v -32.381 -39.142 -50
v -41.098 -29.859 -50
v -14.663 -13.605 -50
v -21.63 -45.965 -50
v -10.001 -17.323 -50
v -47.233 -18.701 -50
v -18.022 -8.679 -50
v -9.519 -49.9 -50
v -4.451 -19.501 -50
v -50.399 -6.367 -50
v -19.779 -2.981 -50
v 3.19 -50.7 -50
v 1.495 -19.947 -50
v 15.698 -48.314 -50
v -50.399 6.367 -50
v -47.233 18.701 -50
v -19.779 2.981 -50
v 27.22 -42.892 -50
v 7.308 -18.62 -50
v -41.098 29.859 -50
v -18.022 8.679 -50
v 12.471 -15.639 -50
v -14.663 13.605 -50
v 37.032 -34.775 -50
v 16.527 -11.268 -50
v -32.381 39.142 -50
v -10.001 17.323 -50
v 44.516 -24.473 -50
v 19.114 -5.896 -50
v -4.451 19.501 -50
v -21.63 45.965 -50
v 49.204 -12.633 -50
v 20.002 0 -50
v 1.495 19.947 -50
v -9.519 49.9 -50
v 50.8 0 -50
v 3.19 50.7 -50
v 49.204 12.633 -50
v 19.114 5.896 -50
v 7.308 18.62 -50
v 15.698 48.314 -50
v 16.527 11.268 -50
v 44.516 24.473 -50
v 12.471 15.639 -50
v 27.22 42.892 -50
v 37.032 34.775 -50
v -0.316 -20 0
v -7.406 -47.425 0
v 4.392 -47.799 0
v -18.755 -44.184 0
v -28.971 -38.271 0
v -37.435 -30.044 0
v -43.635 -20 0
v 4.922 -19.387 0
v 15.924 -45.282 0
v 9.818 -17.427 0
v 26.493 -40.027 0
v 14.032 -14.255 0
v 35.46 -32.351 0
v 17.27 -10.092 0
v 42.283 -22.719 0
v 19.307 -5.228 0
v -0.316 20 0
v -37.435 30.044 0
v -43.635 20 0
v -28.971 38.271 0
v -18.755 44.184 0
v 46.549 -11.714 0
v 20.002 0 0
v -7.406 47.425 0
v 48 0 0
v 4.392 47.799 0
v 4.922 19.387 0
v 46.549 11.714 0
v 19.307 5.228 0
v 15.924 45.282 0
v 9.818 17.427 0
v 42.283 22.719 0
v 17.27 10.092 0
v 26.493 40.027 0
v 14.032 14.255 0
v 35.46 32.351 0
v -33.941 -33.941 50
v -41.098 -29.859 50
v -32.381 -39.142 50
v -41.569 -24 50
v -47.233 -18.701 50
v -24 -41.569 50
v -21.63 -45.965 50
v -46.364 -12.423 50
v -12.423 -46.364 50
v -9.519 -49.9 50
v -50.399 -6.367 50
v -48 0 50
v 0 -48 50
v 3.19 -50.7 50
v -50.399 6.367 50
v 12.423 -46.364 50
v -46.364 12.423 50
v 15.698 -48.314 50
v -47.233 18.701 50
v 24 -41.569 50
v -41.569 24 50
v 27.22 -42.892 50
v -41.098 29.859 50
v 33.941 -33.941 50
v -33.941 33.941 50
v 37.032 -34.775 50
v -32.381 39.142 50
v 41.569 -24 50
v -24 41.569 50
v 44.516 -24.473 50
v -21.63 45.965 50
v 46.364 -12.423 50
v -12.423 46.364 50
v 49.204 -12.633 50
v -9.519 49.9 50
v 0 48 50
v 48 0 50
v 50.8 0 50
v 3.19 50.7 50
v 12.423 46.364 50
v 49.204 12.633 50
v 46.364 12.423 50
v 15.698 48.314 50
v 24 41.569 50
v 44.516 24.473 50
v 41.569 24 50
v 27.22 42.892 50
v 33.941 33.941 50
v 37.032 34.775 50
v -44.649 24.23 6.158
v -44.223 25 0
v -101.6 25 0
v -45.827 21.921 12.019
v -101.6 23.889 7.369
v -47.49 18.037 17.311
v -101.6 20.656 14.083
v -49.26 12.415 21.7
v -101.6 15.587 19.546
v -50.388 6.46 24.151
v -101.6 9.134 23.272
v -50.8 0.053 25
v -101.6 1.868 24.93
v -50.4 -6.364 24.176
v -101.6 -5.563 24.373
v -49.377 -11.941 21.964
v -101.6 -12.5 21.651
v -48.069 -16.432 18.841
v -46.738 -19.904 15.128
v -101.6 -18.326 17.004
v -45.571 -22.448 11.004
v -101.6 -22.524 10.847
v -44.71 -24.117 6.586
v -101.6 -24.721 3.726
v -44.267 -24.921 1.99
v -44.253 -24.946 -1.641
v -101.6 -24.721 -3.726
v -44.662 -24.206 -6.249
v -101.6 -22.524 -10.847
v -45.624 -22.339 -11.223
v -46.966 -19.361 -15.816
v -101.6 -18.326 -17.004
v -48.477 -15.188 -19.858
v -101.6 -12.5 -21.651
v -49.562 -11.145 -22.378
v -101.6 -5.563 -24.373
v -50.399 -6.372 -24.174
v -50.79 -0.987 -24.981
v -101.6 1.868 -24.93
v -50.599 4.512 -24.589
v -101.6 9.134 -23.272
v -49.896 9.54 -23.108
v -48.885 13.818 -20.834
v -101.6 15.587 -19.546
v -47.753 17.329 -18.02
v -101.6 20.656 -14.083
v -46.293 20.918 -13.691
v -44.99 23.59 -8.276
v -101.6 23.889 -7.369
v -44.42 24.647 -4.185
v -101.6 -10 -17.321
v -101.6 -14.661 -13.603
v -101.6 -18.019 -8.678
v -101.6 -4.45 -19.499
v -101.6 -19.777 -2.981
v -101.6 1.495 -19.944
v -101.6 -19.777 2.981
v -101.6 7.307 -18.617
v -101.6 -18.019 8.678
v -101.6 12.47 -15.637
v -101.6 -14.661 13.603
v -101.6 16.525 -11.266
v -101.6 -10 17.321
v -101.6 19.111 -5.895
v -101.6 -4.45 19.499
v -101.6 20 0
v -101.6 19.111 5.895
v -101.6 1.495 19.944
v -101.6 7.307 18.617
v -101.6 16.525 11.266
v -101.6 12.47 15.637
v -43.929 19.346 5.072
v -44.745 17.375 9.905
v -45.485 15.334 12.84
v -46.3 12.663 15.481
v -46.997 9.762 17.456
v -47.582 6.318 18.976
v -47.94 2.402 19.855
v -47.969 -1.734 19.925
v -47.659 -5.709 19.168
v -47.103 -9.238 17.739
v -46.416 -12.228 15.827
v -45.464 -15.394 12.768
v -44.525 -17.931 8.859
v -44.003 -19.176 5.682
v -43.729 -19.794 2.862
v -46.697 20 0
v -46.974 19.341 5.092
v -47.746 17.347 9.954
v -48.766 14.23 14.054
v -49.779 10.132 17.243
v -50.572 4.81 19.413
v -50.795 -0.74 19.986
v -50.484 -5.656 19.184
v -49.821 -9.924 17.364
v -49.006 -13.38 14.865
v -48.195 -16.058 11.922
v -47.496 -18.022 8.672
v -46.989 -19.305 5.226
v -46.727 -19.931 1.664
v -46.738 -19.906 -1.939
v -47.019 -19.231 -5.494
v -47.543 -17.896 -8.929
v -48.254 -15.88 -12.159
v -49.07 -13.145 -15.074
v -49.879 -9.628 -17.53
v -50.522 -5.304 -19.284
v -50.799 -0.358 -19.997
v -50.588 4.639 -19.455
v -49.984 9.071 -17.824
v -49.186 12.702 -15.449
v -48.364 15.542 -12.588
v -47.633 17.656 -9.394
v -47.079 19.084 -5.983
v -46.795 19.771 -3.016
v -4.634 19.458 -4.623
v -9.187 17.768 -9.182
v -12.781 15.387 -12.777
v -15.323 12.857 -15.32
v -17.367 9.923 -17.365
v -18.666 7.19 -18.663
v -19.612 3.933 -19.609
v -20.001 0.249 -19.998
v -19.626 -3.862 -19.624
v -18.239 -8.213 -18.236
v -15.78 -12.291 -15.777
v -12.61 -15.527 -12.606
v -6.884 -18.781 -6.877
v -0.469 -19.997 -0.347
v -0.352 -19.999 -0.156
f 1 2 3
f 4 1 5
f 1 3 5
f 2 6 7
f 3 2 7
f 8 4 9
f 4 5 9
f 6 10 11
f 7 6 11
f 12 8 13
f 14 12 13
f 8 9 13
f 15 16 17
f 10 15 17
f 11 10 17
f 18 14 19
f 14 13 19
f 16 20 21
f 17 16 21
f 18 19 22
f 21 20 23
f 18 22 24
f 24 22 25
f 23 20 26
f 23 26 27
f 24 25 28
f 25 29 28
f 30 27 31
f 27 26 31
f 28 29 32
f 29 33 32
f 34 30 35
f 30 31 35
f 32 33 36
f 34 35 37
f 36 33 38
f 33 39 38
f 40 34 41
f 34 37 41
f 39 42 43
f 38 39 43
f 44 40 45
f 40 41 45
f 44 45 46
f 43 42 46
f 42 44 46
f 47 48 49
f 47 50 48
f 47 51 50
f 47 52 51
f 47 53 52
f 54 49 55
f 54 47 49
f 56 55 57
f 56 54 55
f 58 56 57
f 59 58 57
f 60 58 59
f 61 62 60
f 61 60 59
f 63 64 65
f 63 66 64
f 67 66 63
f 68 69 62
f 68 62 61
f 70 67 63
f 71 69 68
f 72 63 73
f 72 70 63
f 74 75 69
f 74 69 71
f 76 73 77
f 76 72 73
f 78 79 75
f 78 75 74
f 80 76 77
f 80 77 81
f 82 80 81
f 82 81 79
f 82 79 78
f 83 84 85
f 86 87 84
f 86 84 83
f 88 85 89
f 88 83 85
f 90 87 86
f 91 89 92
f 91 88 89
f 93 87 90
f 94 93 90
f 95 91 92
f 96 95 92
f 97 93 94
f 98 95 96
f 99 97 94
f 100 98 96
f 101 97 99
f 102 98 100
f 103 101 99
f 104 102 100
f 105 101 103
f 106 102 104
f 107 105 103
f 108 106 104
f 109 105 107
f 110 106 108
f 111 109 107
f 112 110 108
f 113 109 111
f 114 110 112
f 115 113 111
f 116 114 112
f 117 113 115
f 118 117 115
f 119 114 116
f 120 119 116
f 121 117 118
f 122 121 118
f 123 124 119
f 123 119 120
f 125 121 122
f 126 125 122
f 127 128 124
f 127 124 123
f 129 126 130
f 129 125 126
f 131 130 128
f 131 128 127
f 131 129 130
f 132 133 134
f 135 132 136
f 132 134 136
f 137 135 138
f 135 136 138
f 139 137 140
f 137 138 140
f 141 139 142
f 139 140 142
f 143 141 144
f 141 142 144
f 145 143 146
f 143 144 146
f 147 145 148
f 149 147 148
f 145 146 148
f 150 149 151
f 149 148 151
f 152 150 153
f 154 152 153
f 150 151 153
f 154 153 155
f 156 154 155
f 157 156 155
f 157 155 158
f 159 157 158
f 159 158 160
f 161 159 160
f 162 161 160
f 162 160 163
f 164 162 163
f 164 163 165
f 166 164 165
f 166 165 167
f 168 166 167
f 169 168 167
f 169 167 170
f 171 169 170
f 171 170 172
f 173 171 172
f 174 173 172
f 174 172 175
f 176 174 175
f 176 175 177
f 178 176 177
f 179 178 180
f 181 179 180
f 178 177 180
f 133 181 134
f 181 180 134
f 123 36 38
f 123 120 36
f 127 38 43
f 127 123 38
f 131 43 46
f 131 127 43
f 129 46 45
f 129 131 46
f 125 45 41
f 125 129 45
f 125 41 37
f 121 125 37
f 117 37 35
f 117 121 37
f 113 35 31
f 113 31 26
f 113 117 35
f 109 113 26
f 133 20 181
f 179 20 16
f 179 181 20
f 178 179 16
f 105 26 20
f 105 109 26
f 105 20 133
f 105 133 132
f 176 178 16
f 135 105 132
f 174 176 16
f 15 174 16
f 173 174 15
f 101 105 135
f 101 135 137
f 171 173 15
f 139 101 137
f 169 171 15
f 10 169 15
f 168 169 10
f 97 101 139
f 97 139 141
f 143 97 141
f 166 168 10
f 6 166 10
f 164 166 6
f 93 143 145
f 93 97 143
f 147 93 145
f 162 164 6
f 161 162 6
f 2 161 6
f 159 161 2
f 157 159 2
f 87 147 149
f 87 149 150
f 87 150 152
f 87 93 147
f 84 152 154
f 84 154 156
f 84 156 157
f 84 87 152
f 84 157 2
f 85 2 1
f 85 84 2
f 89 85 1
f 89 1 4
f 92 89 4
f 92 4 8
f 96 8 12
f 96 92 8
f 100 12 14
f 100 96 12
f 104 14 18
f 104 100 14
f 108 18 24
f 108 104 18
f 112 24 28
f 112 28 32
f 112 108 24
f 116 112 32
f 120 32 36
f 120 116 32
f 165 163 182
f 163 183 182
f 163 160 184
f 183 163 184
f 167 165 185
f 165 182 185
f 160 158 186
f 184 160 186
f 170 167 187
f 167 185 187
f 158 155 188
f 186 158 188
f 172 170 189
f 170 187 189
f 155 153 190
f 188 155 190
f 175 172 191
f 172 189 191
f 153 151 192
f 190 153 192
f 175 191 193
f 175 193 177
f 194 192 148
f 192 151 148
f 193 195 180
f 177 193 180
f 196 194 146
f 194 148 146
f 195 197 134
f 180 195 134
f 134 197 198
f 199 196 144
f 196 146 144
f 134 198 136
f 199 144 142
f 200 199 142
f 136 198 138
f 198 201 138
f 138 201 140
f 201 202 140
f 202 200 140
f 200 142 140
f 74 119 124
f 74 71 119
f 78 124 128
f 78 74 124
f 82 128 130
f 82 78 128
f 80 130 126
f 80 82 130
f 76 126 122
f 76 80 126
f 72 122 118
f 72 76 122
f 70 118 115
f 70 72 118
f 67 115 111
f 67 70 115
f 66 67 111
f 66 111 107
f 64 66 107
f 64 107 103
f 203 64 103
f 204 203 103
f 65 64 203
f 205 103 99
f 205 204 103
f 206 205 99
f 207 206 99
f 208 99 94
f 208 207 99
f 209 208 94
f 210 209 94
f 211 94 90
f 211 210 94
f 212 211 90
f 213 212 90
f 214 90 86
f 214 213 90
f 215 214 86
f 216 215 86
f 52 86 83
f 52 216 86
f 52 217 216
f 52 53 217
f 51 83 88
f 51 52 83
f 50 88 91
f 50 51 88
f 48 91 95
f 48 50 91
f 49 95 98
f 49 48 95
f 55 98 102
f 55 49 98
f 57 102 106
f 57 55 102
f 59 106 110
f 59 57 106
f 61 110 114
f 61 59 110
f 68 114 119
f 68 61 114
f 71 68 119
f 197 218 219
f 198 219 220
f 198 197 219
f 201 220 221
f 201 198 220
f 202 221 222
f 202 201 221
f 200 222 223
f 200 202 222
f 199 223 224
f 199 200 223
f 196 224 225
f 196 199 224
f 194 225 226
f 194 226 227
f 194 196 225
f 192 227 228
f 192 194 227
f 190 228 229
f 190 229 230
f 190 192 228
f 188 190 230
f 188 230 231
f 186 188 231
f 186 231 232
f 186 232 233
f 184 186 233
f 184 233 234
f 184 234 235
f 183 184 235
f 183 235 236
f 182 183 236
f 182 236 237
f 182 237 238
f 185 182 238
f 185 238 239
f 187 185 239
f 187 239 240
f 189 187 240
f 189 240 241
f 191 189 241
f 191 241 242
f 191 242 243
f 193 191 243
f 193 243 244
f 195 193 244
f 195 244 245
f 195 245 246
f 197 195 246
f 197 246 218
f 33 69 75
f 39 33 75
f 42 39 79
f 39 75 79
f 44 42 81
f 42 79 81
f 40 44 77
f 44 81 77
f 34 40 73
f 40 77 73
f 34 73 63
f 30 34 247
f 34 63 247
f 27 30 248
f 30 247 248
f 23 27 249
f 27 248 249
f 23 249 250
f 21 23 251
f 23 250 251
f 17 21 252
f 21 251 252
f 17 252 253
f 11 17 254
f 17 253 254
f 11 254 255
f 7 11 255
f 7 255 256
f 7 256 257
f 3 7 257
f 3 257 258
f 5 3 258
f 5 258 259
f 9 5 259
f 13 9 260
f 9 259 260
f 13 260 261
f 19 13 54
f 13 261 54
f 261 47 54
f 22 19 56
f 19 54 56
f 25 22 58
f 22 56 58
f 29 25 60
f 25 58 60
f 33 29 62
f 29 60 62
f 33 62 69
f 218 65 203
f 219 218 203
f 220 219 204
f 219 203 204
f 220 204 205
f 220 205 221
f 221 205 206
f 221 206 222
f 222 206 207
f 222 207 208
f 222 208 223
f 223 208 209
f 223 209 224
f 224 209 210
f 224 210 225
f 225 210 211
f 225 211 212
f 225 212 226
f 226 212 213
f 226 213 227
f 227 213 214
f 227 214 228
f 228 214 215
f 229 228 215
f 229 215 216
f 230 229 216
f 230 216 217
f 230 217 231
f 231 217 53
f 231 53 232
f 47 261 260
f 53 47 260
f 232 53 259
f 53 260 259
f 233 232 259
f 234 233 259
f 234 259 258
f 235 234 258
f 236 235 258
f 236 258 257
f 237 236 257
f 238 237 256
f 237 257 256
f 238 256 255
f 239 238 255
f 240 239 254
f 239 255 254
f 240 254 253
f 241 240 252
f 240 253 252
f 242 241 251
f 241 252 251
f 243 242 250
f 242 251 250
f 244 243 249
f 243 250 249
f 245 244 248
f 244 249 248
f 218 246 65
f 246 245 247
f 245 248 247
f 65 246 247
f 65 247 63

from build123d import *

# Parameters (mm, degrees)
F0_R     = 50.8
F0_R_2   = 48
F1_DEPTH = 50
F2_R     = 50.8
F2_R_2   = 20.0025
F3_DEPTH = 50
F4_R     = 20
F5_DEPTH = 50.801
F7_R     = 25
F7_R_2   = 20


with BuildPart() as f1:
    # F0 (on Top) → F1 (new body, symmetric)
    with BuildSketch(Plane.XY):
        Circle(F0_R)
        Circle(F0_R_2, mode=Mode.SUBTRACT)
    extrude(amount=F1_DEPTH, both=True)

    # F2 (on Top) → F3 (join, through all)
    with BuildSketch(Plane.XY):
        Circle(F2_R)
        Circle(F2_R_2, mode=Mode.SUBTRACT)
    extrude(amount=-F3_DEPTH)

    # F4 (on Right) → F5 (cut, through all)
    with BuildSketch(Plane.YZ):
        Circle(F4_R)
    extrude(amount=-F5_DEPTH, mode=Mode.SUBTRACT)

    # F7 (on offset) → F8 (join, up to the next surface of F1)
    with BuildSketch(Plane.YZ.offset(-101.6)):
        Circle(F7_R)
        Circle(F7_R_2, mode=Mode.SUBTRACT)
    extrude(until=Until.NEXT)


solid = f1.part
